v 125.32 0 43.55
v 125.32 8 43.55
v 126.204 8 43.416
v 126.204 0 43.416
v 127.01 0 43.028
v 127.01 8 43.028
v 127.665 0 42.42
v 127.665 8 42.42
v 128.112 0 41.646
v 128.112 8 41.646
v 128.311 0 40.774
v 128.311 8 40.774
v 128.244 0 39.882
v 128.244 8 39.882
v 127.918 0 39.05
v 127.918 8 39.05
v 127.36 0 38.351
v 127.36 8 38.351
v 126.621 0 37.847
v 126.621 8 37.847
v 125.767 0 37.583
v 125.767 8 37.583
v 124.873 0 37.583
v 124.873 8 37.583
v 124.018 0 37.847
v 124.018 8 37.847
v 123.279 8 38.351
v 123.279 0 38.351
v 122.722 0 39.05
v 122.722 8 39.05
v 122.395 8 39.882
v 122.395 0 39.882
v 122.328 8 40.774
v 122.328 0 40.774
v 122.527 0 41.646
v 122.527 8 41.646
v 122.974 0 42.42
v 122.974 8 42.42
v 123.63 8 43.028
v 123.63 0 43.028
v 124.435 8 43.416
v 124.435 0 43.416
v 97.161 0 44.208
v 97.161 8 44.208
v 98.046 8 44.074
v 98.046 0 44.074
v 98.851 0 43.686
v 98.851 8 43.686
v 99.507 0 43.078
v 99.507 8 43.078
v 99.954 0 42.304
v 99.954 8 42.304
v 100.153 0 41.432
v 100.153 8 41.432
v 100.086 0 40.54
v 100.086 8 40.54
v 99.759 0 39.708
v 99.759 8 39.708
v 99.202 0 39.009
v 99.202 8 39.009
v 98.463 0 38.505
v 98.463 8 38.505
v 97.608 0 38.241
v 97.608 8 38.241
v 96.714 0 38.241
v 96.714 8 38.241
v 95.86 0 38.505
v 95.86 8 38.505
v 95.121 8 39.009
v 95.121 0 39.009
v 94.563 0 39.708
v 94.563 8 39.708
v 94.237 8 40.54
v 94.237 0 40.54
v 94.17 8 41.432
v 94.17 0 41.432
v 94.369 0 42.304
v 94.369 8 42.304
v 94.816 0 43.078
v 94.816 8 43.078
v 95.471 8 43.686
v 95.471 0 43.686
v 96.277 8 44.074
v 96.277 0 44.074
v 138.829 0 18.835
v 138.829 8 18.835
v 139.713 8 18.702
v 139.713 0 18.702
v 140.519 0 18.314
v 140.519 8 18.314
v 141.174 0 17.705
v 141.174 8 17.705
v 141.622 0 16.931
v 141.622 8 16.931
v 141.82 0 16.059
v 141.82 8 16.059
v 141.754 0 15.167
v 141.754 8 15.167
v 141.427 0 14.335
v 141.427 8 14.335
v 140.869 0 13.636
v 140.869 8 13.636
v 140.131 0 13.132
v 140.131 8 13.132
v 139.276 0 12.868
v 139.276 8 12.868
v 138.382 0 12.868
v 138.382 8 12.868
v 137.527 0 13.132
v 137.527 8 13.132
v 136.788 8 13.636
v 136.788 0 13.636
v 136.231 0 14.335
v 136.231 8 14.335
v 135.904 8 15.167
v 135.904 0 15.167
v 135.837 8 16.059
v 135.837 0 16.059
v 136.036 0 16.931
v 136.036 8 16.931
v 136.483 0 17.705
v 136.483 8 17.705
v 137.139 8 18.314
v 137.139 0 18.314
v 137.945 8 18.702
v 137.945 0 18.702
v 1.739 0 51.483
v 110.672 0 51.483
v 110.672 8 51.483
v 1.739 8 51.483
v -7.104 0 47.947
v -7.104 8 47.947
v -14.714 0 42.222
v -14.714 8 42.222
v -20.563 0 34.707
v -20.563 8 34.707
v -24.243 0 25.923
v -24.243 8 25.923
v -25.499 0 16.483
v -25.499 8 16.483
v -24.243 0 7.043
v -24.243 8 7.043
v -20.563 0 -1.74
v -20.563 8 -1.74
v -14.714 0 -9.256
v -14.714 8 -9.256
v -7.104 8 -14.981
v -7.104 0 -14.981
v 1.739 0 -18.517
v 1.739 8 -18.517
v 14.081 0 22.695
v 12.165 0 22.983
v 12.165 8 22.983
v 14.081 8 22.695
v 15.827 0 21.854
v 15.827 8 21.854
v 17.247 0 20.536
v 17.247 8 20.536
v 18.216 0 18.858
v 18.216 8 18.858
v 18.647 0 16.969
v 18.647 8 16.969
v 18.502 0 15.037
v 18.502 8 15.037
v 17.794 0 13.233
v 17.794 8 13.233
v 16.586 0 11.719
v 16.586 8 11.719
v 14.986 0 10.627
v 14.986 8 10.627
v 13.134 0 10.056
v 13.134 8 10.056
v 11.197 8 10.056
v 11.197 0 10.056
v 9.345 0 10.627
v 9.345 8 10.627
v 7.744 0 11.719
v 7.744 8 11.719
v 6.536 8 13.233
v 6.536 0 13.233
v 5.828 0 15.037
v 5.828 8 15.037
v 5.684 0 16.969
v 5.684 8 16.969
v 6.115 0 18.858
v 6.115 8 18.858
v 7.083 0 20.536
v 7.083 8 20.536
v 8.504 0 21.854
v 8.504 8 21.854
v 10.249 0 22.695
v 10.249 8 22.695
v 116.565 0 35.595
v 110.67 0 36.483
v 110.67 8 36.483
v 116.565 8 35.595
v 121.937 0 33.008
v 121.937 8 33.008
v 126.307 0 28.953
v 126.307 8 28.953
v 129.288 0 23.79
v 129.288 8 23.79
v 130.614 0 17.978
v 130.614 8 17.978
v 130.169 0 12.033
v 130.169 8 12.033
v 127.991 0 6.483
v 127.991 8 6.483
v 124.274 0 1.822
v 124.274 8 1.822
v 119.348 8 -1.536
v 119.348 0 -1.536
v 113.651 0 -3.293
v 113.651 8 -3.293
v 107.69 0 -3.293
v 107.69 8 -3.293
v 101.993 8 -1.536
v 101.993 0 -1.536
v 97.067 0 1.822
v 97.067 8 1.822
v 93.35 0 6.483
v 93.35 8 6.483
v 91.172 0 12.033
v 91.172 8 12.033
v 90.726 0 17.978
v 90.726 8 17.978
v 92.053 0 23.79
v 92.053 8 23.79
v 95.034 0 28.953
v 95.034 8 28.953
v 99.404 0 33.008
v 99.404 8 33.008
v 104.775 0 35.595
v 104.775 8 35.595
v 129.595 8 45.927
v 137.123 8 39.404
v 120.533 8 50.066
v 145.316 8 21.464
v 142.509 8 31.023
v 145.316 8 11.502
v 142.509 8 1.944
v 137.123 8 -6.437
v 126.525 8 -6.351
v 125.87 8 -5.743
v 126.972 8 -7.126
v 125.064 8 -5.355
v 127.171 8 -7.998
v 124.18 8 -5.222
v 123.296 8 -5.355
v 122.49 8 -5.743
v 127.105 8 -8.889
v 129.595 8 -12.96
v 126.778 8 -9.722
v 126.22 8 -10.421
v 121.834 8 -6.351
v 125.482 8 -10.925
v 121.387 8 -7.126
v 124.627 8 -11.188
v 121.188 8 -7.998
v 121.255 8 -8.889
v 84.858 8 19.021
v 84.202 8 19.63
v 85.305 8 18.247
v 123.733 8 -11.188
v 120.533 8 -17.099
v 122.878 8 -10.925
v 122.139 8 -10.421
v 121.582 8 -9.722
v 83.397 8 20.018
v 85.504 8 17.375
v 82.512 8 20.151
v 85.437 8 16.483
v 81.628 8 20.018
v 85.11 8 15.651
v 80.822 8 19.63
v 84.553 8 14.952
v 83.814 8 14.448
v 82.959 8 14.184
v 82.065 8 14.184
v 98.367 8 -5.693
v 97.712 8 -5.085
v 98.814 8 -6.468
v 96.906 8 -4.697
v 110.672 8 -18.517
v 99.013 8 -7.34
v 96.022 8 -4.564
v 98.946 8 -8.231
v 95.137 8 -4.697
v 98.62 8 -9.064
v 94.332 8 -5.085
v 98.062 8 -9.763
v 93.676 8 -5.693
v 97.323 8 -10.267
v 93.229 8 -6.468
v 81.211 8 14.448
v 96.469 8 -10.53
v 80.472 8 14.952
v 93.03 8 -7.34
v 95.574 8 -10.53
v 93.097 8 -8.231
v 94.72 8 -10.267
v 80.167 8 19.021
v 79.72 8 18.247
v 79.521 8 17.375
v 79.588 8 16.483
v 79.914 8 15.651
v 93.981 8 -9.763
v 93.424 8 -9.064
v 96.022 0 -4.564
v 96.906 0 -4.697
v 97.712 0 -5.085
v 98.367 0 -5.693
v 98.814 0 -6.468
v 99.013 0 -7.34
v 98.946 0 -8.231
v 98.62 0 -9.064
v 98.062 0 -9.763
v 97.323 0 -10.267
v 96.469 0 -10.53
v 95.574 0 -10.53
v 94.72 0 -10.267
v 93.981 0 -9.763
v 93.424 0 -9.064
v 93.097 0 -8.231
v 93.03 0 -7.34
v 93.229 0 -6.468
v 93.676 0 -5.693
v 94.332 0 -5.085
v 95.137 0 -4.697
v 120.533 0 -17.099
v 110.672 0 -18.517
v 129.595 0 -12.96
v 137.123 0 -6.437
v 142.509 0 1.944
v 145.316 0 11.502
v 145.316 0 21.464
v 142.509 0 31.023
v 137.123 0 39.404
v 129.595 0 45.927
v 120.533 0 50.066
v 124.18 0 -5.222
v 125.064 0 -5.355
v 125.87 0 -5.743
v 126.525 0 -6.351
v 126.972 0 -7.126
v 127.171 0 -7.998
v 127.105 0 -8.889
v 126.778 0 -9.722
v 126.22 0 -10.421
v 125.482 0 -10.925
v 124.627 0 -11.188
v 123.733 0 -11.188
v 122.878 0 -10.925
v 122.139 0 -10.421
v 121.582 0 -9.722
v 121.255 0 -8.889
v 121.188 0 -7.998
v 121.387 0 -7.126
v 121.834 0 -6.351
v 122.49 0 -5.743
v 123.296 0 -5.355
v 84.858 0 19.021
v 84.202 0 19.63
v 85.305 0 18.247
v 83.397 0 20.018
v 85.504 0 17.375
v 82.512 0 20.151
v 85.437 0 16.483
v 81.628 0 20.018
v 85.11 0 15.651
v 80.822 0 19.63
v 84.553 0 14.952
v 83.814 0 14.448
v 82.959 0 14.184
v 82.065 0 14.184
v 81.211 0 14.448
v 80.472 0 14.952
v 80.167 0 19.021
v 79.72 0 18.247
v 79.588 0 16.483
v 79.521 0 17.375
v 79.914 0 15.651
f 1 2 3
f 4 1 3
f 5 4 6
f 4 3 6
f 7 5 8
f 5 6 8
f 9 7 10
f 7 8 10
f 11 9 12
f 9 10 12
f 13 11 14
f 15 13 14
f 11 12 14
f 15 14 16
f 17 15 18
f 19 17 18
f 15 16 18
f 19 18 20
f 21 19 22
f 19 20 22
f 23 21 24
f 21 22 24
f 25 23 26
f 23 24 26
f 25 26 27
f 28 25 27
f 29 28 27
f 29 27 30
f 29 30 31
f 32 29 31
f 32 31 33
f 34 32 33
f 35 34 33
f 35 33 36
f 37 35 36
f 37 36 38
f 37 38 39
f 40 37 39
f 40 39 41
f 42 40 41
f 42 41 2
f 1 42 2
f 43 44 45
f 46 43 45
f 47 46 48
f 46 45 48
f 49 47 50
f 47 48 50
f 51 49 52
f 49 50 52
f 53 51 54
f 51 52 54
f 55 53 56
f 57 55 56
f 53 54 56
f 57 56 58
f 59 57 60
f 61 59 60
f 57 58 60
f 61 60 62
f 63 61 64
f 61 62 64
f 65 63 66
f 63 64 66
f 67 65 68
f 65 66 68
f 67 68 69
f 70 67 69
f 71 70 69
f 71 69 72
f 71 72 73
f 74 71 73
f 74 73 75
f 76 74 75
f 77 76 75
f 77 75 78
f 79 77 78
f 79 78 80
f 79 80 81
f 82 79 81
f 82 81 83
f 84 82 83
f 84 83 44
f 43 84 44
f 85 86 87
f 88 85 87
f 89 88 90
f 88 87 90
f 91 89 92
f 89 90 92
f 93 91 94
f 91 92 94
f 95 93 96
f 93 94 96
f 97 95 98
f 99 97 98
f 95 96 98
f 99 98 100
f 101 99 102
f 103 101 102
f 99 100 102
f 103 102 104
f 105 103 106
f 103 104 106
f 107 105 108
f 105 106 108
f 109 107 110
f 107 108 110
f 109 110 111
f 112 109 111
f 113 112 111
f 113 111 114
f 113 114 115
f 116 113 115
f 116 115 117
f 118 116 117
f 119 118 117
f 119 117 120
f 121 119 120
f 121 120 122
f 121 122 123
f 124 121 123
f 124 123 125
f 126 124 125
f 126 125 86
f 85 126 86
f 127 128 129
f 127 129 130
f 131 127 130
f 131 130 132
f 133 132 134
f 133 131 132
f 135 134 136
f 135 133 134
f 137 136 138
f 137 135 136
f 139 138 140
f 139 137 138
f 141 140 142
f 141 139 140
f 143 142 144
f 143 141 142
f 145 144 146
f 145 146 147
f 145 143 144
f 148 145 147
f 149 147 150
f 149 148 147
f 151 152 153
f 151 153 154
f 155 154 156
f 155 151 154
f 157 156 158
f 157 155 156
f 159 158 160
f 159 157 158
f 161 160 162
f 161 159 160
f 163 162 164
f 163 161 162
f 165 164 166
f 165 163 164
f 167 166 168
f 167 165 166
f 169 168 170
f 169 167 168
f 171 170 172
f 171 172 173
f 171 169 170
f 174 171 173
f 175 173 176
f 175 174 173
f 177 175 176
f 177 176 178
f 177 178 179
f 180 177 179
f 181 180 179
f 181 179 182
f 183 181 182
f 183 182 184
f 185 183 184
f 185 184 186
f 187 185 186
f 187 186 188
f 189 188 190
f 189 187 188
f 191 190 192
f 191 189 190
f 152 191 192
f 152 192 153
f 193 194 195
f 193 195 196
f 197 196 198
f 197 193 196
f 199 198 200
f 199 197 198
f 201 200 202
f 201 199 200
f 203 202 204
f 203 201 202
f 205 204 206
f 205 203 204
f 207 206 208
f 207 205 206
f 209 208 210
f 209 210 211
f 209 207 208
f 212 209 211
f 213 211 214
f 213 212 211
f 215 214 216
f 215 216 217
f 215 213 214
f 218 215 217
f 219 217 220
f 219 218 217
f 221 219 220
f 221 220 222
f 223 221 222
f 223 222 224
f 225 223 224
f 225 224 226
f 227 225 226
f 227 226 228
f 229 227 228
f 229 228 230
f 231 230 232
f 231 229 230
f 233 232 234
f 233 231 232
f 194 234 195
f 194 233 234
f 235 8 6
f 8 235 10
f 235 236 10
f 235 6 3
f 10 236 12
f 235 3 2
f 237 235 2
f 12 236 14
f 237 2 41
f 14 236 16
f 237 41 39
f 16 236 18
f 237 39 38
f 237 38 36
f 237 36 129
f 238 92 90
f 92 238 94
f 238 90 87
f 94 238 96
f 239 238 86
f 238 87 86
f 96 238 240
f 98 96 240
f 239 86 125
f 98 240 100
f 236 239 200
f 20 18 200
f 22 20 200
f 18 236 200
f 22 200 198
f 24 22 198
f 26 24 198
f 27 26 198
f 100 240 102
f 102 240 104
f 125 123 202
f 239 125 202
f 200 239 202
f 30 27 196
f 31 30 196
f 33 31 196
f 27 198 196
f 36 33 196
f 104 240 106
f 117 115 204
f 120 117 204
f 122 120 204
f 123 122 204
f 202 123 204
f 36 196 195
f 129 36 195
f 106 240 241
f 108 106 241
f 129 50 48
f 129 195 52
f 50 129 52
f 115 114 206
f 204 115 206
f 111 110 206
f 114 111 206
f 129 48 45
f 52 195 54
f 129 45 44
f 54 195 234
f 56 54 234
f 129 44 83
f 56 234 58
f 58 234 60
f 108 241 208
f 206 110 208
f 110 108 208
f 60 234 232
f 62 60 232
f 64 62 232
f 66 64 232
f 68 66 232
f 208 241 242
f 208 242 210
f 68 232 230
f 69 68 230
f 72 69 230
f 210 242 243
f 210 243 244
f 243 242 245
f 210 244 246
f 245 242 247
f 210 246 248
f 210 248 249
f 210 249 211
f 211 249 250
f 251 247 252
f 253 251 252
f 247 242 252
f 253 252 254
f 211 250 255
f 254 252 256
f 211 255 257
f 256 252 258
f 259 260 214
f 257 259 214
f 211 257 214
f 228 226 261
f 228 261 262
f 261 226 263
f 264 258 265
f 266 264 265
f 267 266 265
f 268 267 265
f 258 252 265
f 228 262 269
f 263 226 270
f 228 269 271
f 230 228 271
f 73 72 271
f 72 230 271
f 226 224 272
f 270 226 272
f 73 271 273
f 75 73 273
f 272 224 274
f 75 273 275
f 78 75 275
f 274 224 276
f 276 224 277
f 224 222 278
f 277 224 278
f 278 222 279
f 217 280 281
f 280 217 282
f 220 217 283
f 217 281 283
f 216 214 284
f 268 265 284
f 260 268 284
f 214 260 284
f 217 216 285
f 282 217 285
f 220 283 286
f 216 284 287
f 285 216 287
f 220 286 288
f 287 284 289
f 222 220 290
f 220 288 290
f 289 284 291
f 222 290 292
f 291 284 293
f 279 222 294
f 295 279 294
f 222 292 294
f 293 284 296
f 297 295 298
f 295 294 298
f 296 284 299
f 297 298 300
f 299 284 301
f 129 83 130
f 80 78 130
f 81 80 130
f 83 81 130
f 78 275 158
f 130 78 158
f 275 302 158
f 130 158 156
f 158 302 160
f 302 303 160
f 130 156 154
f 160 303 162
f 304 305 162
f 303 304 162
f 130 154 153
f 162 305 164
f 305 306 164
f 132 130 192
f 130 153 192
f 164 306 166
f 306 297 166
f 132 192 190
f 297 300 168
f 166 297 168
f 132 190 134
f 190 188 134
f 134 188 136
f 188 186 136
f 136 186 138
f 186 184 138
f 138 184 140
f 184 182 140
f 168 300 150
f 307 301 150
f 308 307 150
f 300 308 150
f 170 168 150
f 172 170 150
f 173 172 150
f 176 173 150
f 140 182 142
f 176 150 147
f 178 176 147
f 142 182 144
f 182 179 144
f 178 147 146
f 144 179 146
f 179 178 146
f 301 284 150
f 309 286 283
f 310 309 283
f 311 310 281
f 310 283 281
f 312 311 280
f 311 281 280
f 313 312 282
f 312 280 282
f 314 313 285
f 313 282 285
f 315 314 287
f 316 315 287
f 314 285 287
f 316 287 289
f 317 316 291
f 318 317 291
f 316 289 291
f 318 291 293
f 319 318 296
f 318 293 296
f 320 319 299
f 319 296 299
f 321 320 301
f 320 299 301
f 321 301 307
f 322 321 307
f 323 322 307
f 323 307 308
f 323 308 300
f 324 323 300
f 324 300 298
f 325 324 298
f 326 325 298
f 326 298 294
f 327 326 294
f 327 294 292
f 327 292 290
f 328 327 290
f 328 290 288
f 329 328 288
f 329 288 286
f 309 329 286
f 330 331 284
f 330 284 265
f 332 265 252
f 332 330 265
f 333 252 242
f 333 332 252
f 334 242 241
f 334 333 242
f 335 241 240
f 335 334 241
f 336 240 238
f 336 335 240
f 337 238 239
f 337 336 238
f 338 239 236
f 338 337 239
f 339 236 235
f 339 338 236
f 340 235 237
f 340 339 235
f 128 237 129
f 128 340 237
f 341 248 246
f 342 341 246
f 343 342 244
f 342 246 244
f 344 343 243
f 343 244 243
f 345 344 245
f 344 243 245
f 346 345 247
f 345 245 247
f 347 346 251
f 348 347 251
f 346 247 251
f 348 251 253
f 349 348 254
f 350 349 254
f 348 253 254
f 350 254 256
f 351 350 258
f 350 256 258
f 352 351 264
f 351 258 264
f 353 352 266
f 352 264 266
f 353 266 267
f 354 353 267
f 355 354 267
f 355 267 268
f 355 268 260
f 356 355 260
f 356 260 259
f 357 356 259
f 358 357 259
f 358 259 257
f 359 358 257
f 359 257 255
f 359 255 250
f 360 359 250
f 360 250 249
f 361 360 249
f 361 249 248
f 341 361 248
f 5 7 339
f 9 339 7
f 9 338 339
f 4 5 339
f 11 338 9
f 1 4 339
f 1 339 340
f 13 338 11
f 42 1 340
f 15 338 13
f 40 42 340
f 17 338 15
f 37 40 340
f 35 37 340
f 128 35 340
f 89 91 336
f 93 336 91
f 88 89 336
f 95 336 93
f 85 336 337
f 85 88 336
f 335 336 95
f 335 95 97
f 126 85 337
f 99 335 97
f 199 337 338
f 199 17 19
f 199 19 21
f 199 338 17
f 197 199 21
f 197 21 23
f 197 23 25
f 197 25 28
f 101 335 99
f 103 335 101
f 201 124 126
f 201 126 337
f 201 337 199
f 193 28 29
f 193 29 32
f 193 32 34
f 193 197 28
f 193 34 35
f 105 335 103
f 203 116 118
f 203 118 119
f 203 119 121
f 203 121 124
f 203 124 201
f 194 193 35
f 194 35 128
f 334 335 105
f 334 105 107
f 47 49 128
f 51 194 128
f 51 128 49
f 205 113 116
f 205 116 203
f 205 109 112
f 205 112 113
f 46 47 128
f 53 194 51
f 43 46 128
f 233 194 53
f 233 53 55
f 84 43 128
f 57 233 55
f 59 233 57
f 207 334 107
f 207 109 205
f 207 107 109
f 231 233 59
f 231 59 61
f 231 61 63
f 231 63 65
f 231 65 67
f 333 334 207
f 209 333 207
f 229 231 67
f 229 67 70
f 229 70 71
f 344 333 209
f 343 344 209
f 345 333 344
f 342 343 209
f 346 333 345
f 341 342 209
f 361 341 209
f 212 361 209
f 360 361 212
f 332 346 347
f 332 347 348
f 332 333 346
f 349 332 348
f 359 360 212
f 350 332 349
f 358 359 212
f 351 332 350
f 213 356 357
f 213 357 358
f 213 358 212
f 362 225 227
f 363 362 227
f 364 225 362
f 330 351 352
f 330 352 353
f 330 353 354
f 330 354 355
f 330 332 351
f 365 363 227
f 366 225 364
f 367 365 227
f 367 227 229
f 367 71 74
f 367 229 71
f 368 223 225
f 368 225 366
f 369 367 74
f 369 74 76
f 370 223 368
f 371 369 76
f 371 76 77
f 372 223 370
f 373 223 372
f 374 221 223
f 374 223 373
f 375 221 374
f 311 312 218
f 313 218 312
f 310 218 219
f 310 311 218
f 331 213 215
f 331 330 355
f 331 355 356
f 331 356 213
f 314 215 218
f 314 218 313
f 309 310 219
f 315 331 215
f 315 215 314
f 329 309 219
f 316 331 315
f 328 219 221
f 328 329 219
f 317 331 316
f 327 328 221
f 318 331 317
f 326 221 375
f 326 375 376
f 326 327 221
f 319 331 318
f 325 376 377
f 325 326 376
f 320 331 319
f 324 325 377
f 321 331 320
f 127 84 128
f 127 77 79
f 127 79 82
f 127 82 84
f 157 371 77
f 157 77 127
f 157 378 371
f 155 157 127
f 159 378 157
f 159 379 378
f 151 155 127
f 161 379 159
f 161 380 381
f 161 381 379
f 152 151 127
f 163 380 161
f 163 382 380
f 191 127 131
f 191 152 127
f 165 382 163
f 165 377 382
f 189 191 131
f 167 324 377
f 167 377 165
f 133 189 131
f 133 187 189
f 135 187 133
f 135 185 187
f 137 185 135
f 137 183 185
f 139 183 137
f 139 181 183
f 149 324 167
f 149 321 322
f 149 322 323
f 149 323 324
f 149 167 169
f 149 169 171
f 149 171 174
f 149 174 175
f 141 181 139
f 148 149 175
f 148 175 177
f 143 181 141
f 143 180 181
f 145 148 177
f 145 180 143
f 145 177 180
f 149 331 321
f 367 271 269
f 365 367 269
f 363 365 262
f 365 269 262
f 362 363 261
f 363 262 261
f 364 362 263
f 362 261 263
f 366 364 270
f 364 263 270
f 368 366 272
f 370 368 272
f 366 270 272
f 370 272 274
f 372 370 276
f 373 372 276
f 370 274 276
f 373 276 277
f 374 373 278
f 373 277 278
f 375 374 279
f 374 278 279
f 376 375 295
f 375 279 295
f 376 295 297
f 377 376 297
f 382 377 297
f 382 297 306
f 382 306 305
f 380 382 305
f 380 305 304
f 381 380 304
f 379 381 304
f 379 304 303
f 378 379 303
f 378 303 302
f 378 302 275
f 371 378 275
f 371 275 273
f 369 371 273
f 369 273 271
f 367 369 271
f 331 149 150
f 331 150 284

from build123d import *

# Parameters (mm, degrees)
SKETCH_1_R          = 6.5
SKETCH_1_R_2        = 20
EXTRUDE_1_DEPTH     = 8
SKETCH_2_R          = 3
CUT_EXTRUDE_1_DEPTH = 10


with BuildPart() as part:
    # Эскиз1 → Вытянуть1 (new body)
    with BuildSketch(Plane(origin=(0, 0, 0), x_dir=(1, 0, 0), z_dir=(0, 1, 0))):
        with BuildLine():
            Line((1.738556374, 18.516613497), (110.672099026, 18.516613497))
            ThreePointArc((110.672099026, 18.516613497), (145.672099026, -16.483386503), (110.672099026, -51.483386503))
            Line((110.672099026, -51.483386503), (1.738556374, -51.483386503))
            ThreePointArc((1.738556374, -51.483386503), (-25.499232193, -16.483386503), (1.738556374, 18.516613497))
        make_face()
        with Locations(Location((12.165325646, -16.483386503, 0), (0, 0, 270))):
            Circle(SKETCH_1_R, mode=Mode.SUBTRACT)
        with Locations(Location((110.670387559, -16.483386503, 0), (0, 0, 270))):
            Circle(SKETCH_1_R_2, mode=Mode.SUBTRACT)
    extrude(amount=EXTRUDE_1_DEPTH)

    # Эскиз2 → Вырез-Вытянуть1 (cut)
    with BuildSketch(Plane(origin=(0, 8, 0), x_dir=(1, 0, 0), z_dir=(0, 1, 0))):
        with Locations(Location((96.021590781, 7.563843825, 0), (0, 0, 270))):
            Circle(SKETCH_2_R)
        with Locations(Location((124.179862127, 8.221889416, 0), (0, 0, 270))):
            Circle(SKETCH_2_R)
        with Locations(Location((138.828881998, -15.834866101, 0), (0, 0, 270))):
            Circle(SKETCH_2_R)
        with Locations(Location((125.319630524, -40.549667208, 0), (0, 0, 270))):
            Circle(SKETCH_2_R)
        with Locations(Location((97.161359178, -41.207712799, 0), (0, 0, 270))):
            Circle(SKETCH_2_R)
        with Locations(Location((82.512339307, -17.150957282, 0), (0, 0, 270))):
            Circle(SKETCH_2_R)
    extrude(amount=-CUT_EXTRUDE_1_DEPTH, mode=Mode.SUBTRACT)


solid = part.part
